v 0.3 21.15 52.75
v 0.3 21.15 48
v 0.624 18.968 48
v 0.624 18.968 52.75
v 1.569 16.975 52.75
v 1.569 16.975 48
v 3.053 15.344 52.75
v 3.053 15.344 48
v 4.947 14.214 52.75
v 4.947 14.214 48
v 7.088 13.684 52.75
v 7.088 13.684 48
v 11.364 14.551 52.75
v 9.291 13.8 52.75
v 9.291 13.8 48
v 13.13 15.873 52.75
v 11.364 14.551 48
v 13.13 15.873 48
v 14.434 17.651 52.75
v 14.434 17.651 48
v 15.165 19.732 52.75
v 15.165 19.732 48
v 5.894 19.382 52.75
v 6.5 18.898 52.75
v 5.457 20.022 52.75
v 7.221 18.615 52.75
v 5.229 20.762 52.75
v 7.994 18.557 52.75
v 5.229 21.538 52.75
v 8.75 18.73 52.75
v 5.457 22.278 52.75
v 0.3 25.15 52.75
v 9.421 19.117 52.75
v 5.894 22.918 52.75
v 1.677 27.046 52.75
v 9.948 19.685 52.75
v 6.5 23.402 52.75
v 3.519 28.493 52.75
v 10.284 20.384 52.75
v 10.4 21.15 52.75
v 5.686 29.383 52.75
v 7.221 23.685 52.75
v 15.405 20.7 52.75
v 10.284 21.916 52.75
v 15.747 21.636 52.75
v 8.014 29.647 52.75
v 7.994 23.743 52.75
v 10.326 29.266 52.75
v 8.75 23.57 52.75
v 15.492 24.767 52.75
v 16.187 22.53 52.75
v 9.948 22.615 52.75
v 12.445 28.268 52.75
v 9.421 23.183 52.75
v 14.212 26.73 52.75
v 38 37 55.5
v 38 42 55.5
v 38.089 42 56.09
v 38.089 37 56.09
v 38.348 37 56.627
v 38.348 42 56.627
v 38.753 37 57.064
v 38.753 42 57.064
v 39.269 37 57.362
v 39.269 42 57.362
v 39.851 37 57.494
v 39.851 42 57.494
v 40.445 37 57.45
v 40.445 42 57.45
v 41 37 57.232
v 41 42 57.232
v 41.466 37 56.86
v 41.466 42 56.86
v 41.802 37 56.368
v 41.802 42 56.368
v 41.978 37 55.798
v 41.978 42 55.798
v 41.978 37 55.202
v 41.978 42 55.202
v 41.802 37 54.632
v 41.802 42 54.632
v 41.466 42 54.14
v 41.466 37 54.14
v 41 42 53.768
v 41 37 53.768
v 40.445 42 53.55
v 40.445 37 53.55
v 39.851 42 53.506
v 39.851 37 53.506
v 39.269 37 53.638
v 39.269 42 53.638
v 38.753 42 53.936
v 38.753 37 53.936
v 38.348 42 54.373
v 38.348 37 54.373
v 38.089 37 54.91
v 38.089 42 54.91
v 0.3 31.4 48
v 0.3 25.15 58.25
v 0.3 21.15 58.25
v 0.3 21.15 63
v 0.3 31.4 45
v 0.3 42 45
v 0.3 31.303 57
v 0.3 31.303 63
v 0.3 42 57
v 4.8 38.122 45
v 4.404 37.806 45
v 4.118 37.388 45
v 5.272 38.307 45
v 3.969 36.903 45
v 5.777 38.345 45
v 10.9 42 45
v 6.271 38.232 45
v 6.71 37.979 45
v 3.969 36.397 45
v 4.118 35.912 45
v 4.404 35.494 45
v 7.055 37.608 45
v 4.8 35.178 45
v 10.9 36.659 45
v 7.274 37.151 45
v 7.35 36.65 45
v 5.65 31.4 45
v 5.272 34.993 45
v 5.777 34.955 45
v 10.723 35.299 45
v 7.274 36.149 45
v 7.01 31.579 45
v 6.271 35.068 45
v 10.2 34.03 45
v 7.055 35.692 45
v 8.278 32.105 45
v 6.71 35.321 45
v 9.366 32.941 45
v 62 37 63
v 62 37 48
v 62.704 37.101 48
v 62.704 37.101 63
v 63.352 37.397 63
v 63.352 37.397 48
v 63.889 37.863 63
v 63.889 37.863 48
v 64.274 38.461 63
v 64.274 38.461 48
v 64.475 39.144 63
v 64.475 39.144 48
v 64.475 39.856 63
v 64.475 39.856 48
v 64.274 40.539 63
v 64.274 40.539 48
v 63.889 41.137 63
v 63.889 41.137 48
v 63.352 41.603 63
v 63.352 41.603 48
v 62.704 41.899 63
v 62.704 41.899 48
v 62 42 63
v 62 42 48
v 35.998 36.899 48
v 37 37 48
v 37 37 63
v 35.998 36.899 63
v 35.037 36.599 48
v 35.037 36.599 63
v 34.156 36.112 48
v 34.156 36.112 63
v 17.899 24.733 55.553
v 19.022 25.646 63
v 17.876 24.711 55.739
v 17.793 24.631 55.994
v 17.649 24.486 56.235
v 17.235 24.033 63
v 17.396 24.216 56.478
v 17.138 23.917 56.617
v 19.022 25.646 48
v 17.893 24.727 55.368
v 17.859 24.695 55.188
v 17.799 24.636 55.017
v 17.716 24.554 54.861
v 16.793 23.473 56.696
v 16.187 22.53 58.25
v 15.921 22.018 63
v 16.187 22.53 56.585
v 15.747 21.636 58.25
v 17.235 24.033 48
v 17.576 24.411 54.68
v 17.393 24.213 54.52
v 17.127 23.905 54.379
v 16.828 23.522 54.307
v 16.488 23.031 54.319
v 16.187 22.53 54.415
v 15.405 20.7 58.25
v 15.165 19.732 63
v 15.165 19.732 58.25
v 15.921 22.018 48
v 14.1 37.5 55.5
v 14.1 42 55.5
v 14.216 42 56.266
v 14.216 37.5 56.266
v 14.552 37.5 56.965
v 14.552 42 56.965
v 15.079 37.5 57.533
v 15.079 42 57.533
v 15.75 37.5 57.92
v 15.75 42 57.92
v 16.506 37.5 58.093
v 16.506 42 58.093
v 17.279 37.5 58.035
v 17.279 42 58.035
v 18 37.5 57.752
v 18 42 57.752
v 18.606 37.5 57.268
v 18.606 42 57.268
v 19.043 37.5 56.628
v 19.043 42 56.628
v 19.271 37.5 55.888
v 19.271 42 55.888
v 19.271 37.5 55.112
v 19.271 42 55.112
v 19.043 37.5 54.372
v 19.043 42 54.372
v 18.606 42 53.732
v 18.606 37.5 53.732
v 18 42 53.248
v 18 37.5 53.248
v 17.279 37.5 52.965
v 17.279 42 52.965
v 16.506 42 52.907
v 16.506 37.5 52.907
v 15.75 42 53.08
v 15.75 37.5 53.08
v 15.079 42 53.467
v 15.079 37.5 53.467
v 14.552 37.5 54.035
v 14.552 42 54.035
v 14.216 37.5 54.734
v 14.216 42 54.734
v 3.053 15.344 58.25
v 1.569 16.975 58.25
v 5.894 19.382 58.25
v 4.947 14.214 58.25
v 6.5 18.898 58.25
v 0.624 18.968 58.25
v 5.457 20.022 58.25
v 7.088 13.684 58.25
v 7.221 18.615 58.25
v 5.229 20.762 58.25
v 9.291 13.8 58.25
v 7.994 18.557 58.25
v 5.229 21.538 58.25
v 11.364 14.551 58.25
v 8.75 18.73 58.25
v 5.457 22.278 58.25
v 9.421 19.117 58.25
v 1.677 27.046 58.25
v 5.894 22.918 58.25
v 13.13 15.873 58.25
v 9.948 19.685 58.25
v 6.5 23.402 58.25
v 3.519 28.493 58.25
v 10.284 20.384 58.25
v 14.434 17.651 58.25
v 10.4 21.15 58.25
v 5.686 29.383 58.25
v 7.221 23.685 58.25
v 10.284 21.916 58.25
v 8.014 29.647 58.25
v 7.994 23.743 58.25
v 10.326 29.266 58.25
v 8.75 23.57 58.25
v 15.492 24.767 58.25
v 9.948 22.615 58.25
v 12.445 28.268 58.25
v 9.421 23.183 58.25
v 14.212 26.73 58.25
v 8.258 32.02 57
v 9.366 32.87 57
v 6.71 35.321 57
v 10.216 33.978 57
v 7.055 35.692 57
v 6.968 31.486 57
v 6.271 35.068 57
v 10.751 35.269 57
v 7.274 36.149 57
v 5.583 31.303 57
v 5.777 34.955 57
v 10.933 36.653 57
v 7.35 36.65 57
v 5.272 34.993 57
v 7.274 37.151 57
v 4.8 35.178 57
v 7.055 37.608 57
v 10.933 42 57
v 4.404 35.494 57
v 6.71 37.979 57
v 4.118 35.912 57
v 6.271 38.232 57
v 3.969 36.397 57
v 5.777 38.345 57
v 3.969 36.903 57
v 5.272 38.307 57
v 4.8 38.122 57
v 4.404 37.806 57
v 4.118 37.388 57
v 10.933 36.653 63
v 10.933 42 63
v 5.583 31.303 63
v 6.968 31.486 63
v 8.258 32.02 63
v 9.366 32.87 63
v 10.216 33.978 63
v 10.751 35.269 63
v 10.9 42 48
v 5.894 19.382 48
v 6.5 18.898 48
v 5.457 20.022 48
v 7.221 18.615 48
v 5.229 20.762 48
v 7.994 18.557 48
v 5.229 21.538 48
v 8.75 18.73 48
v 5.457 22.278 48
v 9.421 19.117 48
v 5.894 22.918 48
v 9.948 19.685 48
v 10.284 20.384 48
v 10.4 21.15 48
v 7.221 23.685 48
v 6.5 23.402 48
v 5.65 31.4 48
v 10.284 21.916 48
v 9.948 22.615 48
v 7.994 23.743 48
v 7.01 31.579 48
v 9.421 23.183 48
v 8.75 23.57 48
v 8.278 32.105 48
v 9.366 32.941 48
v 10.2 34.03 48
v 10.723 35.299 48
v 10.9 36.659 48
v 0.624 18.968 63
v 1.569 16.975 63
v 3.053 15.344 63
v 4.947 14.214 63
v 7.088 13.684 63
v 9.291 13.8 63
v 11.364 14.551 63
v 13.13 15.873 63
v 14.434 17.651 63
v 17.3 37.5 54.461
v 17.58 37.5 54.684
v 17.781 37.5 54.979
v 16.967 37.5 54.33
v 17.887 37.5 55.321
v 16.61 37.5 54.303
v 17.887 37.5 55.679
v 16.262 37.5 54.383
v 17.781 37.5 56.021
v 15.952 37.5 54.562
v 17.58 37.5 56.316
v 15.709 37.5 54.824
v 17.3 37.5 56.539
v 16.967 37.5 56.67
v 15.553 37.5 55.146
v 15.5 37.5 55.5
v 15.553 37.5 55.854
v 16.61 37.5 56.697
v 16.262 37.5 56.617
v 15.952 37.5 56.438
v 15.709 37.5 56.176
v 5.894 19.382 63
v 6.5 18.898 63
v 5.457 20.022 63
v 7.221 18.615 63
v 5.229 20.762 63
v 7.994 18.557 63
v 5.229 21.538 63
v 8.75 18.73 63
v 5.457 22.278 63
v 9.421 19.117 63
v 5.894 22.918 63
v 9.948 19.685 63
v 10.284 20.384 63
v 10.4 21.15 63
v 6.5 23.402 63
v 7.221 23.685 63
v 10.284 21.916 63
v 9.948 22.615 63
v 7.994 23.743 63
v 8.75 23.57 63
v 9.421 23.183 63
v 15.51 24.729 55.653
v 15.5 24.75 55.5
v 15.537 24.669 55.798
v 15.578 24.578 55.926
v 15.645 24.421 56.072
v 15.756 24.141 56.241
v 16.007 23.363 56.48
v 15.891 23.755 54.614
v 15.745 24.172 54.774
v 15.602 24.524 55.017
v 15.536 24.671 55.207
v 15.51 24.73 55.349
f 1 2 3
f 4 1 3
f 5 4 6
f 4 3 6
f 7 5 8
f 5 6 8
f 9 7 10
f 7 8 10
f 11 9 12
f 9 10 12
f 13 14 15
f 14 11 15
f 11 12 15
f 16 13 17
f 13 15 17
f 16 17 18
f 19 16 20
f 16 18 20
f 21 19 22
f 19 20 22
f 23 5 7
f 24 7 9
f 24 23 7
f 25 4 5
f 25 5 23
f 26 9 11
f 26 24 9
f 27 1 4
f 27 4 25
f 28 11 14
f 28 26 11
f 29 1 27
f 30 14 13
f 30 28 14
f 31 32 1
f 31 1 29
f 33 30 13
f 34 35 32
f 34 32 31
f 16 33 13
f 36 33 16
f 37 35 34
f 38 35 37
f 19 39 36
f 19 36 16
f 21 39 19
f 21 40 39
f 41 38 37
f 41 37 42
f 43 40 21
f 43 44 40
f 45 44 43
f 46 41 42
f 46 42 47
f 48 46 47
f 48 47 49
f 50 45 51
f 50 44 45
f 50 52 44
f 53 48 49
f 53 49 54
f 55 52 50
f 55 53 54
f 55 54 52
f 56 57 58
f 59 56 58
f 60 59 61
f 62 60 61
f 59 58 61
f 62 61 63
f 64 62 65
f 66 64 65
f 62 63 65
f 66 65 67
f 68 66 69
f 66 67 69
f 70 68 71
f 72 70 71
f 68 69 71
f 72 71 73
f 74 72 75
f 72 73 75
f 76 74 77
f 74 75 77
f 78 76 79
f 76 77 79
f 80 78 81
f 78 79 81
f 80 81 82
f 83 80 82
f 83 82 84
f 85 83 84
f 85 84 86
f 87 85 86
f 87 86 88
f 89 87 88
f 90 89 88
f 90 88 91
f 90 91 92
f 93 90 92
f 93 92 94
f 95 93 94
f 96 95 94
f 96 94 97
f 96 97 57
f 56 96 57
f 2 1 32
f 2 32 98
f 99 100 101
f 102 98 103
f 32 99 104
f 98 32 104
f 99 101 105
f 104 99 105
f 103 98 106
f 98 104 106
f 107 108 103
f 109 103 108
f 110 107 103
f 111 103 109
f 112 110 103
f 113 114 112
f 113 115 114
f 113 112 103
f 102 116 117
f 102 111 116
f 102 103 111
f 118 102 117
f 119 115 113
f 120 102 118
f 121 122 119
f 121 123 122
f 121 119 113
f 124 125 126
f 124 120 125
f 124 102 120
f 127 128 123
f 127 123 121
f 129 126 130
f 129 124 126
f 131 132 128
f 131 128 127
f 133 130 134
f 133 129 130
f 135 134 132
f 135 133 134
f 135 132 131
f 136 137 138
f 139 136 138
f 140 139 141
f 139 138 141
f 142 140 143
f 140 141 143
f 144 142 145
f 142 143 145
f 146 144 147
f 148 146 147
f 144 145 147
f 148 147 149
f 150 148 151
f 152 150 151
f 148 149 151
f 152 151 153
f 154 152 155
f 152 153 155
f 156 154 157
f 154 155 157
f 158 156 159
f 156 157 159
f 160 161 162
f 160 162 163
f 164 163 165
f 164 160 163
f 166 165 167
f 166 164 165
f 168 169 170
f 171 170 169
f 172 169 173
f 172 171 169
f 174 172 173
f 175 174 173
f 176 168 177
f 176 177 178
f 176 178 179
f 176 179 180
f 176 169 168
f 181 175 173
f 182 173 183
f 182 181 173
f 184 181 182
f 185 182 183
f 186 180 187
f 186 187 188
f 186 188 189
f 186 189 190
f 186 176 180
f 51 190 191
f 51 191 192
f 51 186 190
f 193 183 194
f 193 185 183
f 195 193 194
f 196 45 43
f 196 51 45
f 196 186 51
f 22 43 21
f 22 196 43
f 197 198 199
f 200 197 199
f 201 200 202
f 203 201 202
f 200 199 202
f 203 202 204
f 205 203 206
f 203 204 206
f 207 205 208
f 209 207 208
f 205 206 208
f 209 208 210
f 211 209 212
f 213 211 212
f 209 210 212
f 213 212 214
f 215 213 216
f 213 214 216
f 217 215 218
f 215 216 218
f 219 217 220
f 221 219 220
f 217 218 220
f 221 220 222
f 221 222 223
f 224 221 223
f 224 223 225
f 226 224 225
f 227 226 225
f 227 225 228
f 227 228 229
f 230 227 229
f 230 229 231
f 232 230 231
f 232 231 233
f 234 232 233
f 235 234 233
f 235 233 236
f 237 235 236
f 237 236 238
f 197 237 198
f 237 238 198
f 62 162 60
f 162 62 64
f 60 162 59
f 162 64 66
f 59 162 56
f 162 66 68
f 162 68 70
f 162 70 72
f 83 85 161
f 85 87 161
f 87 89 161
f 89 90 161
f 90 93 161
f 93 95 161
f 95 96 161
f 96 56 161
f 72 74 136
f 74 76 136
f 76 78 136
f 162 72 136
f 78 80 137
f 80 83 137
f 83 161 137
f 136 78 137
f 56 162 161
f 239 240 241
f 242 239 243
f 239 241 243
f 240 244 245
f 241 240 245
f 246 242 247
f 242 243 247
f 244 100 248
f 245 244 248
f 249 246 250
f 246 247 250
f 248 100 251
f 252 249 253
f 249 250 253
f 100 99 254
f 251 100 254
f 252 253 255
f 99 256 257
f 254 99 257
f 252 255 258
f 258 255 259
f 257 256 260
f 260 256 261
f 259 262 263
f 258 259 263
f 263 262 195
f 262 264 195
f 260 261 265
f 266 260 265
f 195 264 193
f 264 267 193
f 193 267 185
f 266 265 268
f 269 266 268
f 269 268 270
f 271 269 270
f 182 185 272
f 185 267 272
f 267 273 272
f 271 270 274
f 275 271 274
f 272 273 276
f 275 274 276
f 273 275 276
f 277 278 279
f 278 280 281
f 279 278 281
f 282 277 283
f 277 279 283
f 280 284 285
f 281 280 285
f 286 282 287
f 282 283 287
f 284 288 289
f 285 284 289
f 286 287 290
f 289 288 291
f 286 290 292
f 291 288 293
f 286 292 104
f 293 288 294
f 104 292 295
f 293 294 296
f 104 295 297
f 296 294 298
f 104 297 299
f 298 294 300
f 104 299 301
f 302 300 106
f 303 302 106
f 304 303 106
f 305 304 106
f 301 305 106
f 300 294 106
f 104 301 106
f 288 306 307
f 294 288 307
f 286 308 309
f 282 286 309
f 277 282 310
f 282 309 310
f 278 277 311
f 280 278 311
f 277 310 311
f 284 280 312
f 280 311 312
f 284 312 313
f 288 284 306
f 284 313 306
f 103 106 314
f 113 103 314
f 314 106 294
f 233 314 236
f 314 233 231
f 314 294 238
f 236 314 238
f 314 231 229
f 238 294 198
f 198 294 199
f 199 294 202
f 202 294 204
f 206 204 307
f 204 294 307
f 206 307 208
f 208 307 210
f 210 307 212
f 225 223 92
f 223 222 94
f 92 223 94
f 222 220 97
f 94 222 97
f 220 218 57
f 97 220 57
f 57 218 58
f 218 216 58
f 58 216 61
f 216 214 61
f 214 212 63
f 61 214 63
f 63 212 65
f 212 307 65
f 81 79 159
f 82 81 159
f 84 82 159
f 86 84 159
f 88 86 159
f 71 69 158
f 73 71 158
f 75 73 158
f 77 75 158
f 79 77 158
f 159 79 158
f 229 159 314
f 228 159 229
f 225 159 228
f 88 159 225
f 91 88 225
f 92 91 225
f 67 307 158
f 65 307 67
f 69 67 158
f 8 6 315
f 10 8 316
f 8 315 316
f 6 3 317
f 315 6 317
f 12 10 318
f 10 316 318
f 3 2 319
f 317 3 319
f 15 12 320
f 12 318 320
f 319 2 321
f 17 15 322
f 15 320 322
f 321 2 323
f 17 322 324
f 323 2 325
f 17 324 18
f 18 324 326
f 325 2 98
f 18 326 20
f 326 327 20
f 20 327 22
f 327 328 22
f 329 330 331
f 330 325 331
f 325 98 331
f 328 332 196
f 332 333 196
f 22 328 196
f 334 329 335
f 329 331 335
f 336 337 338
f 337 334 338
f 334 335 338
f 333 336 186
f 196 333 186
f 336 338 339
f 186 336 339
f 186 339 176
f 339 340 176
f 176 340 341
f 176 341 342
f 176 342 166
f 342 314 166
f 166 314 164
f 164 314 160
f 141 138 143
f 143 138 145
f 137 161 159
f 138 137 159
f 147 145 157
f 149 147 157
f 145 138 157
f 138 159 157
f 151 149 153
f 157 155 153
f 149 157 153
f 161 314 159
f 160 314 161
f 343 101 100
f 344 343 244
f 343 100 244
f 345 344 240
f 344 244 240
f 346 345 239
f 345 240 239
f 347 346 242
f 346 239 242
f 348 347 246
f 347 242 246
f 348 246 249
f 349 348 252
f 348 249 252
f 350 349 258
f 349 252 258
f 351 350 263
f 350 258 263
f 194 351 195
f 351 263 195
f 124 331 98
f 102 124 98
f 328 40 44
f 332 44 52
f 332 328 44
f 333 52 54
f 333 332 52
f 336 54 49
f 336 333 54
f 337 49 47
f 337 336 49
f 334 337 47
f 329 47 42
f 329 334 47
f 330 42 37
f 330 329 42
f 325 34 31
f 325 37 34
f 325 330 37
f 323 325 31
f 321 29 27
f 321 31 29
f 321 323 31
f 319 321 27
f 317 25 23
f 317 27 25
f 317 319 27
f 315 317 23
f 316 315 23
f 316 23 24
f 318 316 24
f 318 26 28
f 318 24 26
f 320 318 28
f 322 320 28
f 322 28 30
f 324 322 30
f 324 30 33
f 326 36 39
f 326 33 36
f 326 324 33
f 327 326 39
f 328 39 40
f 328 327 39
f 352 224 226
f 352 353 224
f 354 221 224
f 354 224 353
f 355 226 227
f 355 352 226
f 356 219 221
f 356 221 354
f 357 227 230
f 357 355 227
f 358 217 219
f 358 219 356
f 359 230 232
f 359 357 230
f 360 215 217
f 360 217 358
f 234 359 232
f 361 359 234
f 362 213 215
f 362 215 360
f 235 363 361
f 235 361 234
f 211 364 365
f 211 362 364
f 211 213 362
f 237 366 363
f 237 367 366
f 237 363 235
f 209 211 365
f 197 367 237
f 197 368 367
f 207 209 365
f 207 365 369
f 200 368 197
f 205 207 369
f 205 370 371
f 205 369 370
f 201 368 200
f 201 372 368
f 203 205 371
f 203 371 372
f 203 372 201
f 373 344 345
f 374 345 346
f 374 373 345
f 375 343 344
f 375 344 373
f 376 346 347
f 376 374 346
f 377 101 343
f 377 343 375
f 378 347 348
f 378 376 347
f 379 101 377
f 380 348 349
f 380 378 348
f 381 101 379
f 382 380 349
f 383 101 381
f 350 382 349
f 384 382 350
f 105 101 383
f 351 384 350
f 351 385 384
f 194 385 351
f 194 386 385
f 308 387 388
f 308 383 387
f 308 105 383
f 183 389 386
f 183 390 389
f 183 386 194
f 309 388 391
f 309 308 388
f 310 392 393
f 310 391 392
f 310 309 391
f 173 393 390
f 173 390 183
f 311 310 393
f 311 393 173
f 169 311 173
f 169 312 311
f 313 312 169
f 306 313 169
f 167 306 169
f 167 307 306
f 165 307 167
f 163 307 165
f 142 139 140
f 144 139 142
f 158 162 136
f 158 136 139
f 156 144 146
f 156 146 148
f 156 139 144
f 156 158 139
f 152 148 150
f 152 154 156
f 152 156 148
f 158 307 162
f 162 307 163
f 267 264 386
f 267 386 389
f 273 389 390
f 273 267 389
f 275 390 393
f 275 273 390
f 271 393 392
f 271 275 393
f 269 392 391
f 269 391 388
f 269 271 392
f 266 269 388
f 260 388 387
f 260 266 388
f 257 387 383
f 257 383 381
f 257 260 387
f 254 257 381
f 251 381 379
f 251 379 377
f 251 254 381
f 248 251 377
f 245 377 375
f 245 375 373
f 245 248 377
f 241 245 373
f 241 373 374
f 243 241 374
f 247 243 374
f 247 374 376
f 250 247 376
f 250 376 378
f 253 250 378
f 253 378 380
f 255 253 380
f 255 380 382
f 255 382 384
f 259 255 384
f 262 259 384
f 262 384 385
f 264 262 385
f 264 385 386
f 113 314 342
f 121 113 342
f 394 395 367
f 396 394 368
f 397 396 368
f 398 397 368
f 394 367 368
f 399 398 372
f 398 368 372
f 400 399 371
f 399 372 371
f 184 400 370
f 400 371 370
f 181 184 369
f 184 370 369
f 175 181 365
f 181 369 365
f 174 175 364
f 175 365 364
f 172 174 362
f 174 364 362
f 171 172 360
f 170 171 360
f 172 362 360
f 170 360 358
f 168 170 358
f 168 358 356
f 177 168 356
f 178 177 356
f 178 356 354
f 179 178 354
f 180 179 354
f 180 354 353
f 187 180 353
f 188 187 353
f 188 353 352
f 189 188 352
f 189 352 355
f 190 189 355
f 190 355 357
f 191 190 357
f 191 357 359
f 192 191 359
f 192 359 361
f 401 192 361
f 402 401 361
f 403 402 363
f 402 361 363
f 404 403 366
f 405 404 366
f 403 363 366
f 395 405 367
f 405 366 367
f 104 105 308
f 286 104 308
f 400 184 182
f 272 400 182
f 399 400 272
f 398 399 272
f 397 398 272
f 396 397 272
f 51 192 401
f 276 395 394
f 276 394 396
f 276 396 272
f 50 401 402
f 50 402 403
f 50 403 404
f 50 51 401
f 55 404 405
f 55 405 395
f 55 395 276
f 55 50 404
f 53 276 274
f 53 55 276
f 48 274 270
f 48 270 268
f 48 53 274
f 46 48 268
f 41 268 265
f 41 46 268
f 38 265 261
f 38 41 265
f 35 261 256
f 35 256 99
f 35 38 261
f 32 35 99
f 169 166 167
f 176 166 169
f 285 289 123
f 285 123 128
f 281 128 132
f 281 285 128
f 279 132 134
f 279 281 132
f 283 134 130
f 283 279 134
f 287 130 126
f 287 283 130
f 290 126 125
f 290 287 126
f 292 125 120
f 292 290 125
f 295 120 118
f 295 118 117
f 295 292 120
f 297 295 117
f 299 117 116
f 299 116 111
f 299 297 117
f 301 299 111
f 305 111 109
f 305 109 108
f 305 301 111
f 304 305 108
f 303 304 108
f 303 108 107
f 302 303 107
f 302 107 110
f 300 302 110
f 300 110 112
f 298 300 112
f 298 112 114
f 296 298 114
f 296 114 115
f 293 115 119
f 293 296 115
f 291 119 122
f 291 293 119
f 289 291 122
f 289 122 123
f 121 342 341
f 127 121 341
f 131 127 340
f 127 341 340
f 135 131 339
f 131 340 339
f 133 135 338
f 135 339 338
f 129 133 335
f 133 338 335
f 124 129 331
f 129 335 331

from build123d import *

# Parameters (mm, degrees)
SKETCH009_R        = 8.5
SKETCH009_R_2      = 2.5
PAD012_DEPTH       = 5.5
SKETCH006_R        = 1.7
SKETCH006_R_2      = 2.6
PAD005_DEPTH       = 15
SKETCH024_R        = 1.7
PAD013_DEPTH       = 3
SKETCH014_R        = 2
SKETCH014_R_2      = 1.2
POCKET011002_DEPTH = 28.351
SKETCH017_R        = 2.6
POCKET011003_DEPTH = 4.5
POCKET011004_DEPTH = 6


with BuildPart() as roller_copy:
    # Sketch009 → Pad012 (new body)
    with BuildSketch(Plane(origin=(7.8, 21.15, 52.75), x_dir=(1, 0, 0), z_dir=(0, 0, 1))):
        Circle(SKETCH009_R)
        Circle(SKETCH009_R_2, mode=Mode.SUBTRACT)
    extrude(amount=PAD012_DEPTH)


with BuildPart() as tensioner001:
    # Sketch006 → Pad005 (new body)
    with BuildSketch(Plane.XY.offset(48)):
        with BuildLine():
            ThreePointArc((0.3, 21.15), (7.088015, 13.683871), (15.164821, 19.732461))
            ThreePointArc((19.022004, 25.646185), (16.51278, 23.068036), (15.164821, 19.732461))
            Line((34.156005, 36.112383), (19.022004, 25.646185))
            ThreePointArc((37, 37), (35.510355, 36.77294), (34.156005, 36.112383))
            Line((37, 37), (62, 37))
            ThreePointArc((62, 37), (64.5, 39.5), (62, 42))
            Line((0.3, 42), (62, 42))
            Line((0.3, 21.15), (0.3, 42))
        make_face()
        with Locations((5.65, 36.65)):
            Circle(SKETCH006_R, mode=Mode.SUBTRACT)
        with Locations((7.8, 21.15)):
            Circle(SKETCH006_R_2, mode=Mode.SUBTRACT)
    extrude(amount=PAD005_DEPTH)

    # Sketch024 → Pad013 (new body)
    with BuildSketch(Plane(origin=(0, 0, 48), x_dir=(1, 0, 0), z_dir=(0, 0, -1))):
        with BuildLine():
            Line((0.3, -42), (10.899992, -42))
            Line((10.899992, -42), (10.899992, -36.659185))
            ThreePointArc((10.899992, -36.659185), (9.365563, -32.940945), (5.650018, -31.4))
            Line((5.650018, -31.4), (0.3, -31.4))
            Line((0.3, -31.4), (0.3, -42))
        make_face()
        with Locations((5.65, -36.65)):
            Circle(SKETCH024_R, mode=Mode.SUBTRACT)
    extrude(amount=PAD013_DEPTH)

    # Sketch014 → Pocket011002 (cut, through all)
    with BuildSketch(Plane(origin=(0, 42, 48), x_dir=(-1, 0, 0), z_dir=(0, 1, 0))):
        with Locations((-40, 7.5)):
            Circle(SKETCH014_R)
        with Locations((-16.7, 7.5)):
            Circle(SKETCH014_R_2)
    extrude(amount=-POCKET011002_DEPTH, mode=Mode.SUBTRACT)

    # Sketch017 → Pocket011003 (cut)
    with BuildSketch(Plane(origin=(0, 42, 48), x_dir=(-1, 0, 0), z_dir=(0, 1, 0))):
        with Locations((-16.7, 7.5)):
            Circle(SKETCH017_R)
    extrude(amount=-POCKET011003_DEPTH, mode=Mode.SUBTRACT)

    # Sketch025 → Pocket011004 (cut)
    with BuildSketch(Plane.XY.offset(63)):
        with BuildLine():
            Line((-0.494617, 43), (10.932914, 43))
            Line((10.932914, 36.653394), (10.932914, 43))
            ThreePointArc((5.582914, 31.303394), (9.365935, 32.870373), (10.932914, 36.653394))
            Line((-0.494617, 31.303394), (5.582914, 31.303394))
            Line((-0.494617, 31.303394), (-0.494617, 43))
        make_face()
    extrude(amount=-POCKET011004_DEPTH, mode=Mode.SUBTRACT)

    # Cut: cut roller_copy
    add(roller_copy.part, mode=Mode.SUBTRACT)


solid = tensioner001.part
